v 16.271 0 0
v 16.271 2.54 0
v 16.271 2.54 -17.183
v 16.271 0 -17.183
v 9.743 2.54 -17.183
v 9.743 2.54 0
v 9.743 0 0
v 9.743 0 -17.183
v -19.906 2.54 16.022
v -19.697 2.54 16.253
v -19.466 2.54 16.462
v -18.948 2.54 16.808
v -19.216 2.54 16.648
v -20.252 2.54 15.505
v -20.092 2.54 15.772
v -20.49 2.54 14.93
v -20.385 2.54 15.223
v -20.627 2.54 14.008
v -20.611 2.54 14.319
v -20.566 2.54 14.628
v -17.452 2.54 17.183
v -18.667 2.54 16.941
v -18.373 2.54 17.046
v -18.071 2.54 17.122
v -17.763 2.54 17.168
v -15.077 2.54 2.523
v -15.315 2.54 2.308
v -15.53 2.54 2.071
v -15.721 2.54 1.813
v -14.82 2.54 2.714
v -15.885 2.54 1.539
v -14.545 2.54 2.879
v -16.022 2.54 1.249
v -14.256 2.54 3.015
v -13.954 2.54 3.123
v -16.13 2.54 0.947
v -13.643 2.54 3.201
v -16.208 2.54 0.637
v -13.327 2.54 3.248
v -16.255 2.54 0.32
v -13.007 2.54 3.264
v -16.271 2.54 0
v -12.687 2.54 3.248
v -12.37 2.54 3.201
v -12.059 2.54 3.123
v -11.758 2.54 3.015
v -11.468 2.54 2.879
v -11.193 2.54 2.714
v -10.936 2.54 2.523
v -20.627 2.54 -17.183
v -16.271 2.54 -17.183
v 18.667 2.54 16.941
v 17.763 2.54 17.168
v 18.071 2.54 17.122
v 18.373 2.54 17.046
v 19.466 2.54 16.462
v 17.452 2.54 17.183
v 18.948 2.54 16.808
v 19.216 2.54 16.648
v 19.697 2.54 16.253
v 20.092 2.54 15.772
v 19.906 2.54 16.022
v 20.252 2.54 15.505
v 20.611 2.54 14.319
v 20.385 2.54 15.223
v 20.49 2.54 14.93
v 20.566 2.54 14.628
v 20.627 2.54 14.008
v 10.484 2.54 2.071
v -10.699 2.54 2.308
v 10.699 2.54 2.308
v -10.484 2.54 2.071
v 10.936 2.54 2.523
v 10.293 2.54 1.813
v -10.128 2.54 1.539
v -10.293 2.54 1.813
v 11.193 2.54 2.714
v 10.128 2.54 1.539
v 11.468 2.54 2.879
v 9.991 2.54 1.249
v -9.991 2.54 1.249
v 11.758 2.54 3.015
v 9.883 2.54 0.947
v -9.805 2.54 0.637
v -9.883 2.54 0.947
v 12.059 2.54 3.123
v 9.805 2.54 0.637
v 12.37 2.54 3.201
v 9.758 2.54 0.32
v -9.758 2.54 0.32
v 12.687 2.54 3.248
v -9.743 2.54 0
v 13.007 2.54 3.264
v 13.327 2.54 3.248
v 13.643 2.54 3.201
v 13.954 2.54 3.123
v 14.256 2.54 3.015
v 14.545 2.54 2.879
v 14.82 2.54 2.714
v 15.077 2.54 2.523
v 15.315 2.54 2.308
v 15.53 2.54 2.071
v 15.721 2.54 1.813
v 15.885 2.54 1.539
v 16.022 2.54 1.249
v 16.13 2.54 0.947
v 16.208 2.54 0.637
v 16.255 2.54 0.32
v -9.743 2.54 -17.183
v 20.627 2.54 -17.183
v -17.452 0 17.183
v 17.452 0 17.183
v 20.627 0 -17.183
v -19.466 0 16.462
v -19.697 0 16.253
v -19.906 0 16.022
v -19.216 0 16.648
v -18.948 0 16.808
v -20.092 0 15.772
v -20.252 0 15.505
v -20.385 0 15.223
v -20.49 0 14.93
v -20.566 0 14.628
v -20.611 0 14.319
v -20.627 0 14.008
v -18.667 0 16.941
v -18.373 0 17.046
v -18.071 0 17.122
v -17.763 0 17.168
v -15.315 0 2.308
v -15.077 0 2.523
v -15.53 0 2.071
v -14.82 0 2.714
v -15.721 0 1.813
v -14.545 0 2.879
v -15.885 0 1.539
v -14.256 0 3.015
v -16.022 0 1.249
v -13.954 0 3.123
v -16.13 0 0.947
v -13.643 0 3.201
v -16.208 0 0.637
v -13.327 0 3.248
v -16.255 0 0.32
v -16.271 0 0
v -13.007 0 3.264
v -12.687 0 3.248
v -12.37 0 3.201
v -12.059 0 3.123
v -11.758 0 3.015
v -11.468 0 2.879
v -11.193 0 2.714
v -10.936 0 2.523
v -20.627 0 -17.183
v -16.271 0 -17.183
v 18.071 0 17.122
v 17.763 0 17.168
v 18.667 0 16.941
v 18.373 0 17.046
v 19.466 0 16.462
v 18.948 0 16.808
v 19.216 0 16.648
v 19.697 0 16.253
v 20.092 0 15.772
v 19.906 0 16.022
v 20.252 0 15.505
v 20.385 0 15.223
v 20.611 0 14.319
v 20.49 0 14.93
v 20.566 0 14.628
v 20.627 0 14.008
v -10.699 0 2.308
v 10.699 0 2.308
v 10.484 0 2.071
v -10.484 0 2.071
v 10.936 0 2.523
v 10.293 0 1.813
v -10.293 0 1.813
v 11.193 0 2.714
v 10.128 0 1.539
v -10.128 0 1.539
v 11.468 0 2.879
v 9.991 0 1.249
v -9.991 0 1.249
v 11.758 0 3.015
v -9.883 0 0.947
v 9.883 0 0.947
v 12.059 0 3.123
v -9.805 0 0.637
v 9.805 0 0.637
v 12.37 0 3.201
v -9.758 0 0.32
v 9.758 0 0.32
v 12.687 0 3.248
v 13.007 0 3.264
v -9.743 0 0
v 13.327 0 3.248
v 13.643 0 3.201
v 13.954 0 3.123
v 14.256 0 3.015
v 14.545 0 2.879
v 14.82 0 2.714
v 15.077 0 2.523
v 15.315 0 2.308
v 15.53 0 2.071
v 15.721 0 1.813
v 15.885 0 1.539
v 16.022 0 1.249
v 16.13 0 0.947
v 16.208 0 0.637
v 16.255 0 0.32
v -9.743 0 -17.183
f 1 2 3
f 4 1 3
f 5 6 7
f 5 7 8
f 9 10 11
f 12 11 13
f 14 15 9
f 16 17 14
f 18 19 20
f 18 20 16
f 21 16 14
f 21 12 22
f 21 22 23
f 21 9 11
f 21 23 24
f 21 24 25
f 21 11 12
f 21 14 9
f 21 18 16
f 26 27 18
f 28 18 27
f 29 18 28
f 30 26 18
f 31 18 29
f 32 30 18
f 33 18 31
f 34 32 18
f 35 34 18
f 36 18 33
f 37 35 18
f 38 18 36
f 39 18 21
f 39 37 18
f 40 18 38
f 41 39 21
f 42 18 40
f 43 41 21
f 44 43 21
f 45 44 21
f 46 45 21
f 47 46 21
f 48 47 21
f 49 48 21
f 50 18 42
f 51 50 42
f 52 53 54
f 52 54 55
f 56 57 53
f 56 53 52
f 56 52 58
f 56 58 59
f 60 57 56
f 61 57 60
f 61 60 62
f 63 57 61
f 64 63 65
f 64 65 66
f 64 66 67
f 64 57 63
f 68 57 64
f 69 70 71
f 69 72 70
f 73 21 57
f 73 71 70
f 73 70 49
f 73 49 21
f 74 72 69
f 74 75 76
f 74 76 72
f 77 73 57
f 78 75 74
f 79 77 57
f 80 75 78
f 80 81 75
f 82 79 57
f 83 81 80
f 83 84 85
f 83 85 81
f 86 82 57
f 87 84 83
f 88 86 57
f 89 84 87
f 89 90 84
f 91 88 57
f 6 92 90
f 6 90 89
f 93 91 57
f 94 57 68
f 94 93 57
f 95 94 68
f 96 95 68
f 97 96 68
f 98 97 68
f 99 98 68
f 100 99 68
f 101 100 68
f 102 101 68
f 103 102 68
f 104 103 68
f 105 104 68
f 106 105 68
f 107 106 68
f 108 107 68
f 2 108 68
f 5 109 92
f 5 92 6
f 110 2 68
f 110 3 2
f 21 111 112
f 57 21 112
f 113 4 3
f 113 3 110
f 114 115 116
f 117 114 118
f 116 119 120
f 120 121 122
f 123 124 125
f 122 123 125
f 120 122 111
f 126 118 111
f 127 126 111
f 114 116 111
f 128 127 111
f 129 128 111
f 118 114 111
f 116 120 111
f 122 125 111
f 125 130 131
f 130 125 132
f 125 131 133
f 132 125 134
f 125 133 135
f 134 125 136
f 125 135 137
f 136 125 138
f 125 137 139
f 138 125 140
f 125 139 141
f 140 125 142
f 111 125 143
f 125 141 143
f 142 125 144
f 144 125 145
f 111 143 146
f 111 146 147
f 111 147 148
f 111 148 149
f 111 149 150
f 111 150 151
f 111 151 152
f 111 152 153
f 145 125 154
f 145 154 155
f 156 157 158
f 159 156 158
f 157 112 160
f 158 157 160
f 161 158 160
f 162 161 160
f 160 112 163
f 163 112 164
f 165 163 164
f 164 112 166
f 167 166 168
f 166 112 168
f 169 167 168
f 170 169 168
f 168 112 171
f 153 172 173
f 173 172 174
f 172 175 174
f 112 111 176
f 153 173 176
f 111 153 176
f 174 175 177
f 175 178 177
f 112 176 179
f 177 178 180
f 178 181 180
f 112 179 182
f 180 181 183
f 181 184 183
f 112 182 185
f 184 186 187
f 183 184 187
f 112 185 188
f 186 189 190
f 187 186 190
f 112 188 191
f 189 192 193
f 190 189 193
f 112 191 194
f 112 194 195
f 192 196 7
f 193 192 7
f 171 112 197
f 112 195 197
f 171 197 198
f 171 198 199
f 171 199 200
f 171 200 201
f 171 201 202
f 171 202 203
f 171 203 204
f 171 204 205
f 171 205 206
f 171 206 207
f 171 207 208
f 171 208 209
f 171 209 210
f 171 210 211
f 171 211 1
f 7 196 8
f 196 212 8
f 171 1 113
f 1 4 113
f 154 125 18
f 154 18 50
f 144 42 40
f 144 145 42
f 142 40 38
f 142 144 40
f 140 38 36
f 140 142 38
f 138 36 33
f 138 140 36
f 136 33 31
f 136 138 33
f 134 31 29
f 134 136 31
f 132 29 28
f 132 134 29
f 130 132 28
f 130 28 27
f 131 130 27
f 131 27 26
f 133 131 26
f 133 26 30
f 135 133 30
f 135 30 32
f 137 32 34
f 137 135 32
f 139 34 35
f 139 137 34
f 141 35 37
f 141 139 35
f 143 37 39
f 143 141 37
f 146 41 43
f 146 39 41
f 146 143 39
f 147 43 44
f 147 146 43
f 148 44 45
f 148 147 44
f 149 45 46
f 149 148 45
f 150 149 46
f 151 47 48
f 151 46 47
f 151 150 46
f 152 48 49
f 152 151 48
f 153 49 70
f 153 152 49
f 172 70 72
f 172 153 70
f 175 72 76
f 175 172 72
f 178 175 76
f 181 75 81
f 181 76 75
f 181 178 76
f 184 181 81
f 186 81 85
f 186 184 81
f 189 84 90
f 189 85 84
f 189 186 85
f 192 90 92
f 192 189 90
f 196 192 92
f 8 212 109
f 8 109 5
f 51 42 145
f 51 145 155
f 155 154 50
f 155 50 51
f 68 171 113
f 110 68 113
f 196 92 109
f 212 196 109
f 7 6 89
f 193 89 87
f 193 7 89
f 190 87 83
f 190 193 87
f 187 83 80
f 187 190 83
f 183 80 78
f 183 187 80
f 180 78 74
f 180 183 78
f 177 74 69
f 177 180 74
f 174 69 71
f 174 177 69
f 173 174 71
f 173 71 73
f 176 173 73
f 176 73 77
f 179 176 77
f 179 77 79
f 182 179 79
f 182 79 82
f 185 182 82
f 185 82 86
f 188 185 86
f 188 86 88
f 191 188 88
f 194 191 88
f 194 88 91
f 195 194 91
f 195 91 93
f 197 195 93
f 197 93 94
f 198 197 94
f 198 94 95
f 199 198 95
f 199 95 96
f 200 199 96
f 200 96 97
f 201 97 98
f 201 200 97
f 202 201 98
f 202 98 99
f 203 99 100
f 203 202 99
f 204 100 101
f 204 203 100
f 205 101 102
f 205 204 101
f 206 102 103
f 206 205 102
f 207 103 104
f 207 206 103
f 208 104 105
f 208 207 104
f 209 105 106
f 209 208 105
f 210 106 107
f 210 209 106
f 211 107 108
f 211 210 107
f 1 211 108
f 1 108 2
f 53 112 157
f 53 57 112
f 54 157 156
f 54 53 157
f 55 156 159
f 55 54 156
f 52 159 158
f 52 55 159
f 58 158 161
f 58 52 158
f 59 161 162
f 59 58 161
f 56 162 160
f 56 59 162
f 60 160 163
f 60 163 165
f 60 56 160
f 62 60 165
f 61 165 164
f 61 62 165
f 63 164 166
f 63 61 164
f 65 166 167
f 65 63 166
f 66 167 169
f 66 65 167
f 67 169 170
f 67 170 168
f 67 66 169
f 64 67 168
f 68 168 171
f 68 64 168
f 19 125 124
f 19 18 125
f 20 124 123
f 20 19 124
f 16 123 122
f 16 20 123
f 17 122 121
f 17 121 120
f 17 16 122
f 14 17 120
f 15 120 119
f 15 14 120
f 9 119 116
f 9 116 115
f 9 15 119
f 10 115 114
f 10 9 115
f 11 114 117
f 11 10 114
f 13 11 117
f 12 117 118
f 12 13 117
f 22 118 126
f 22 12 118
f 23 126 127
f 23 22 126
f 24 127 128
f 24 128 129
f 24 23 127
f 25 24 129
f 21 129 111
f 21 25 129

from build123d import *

# Parameters (mm, degrees)
SKETCH2_W       = 41.253356914
SKETCH2_H       = 34.3662
SKETCH2_R       = 3.2639
MAIN_BODY_DEPTH = 2.54
FILLET1_R       = 3.175
SKETCH3_W       = 6.5278
SKETCH3_H       = 17.1831
SLOTS_DEPTH     = 27.966097044


with BuildPart() as part:
    # Sketch2 → Main Body (new body)
    with BuildSketch(Plane(origin=(0, 0, 0), x_dir=(1, 0, 0), z_dir=(0, 1, 0))):
        Rectangle(SKETCH2_W, SKETCH2_H)
        with Locations(Location((-13.006678457, 0, 0), (0, 0, 270))):
            Circle(SKETCH2_R, mode=Mode.SUBTRACT)
        with Locations(Location((13.006678457, 0, 0), (0, 0, 90))):
            Circle(SKETCH2_R, mode=Mode.SUBTRACT)
    extrude(amount=MAIN_BODY_DEPTH)

    # Fillet1
    fillet1_edges = [part.edges().sort_by_distance(p)[0] for p in [
        (20.626678457, 1.27, 17.1831),
        (-20.626678457, 1.27, 17.1831),
    ]]
    fillet(fillet1_edges, radius=FILLET1_R)

    # Sketch3 → Slots (cut, through all)
    with BuildSketch(Plane(origin=(0, 2.54, 0), x_dir=(1, 0, 0), z_dir=(0, 1, 0))):
        with Locations((-13.006678457, 8.59155)):
            Rectangle(SKETCH3_W, SKETCH3_H)
        with Locations((13.006678457, 8.59155)):
            Rectangle(SKETCH3_W, SKETCH3_H)
    extrude(amount=-SLOTS_DEPTH, mode=Mode.SUBTRACT)


solid = part.part
